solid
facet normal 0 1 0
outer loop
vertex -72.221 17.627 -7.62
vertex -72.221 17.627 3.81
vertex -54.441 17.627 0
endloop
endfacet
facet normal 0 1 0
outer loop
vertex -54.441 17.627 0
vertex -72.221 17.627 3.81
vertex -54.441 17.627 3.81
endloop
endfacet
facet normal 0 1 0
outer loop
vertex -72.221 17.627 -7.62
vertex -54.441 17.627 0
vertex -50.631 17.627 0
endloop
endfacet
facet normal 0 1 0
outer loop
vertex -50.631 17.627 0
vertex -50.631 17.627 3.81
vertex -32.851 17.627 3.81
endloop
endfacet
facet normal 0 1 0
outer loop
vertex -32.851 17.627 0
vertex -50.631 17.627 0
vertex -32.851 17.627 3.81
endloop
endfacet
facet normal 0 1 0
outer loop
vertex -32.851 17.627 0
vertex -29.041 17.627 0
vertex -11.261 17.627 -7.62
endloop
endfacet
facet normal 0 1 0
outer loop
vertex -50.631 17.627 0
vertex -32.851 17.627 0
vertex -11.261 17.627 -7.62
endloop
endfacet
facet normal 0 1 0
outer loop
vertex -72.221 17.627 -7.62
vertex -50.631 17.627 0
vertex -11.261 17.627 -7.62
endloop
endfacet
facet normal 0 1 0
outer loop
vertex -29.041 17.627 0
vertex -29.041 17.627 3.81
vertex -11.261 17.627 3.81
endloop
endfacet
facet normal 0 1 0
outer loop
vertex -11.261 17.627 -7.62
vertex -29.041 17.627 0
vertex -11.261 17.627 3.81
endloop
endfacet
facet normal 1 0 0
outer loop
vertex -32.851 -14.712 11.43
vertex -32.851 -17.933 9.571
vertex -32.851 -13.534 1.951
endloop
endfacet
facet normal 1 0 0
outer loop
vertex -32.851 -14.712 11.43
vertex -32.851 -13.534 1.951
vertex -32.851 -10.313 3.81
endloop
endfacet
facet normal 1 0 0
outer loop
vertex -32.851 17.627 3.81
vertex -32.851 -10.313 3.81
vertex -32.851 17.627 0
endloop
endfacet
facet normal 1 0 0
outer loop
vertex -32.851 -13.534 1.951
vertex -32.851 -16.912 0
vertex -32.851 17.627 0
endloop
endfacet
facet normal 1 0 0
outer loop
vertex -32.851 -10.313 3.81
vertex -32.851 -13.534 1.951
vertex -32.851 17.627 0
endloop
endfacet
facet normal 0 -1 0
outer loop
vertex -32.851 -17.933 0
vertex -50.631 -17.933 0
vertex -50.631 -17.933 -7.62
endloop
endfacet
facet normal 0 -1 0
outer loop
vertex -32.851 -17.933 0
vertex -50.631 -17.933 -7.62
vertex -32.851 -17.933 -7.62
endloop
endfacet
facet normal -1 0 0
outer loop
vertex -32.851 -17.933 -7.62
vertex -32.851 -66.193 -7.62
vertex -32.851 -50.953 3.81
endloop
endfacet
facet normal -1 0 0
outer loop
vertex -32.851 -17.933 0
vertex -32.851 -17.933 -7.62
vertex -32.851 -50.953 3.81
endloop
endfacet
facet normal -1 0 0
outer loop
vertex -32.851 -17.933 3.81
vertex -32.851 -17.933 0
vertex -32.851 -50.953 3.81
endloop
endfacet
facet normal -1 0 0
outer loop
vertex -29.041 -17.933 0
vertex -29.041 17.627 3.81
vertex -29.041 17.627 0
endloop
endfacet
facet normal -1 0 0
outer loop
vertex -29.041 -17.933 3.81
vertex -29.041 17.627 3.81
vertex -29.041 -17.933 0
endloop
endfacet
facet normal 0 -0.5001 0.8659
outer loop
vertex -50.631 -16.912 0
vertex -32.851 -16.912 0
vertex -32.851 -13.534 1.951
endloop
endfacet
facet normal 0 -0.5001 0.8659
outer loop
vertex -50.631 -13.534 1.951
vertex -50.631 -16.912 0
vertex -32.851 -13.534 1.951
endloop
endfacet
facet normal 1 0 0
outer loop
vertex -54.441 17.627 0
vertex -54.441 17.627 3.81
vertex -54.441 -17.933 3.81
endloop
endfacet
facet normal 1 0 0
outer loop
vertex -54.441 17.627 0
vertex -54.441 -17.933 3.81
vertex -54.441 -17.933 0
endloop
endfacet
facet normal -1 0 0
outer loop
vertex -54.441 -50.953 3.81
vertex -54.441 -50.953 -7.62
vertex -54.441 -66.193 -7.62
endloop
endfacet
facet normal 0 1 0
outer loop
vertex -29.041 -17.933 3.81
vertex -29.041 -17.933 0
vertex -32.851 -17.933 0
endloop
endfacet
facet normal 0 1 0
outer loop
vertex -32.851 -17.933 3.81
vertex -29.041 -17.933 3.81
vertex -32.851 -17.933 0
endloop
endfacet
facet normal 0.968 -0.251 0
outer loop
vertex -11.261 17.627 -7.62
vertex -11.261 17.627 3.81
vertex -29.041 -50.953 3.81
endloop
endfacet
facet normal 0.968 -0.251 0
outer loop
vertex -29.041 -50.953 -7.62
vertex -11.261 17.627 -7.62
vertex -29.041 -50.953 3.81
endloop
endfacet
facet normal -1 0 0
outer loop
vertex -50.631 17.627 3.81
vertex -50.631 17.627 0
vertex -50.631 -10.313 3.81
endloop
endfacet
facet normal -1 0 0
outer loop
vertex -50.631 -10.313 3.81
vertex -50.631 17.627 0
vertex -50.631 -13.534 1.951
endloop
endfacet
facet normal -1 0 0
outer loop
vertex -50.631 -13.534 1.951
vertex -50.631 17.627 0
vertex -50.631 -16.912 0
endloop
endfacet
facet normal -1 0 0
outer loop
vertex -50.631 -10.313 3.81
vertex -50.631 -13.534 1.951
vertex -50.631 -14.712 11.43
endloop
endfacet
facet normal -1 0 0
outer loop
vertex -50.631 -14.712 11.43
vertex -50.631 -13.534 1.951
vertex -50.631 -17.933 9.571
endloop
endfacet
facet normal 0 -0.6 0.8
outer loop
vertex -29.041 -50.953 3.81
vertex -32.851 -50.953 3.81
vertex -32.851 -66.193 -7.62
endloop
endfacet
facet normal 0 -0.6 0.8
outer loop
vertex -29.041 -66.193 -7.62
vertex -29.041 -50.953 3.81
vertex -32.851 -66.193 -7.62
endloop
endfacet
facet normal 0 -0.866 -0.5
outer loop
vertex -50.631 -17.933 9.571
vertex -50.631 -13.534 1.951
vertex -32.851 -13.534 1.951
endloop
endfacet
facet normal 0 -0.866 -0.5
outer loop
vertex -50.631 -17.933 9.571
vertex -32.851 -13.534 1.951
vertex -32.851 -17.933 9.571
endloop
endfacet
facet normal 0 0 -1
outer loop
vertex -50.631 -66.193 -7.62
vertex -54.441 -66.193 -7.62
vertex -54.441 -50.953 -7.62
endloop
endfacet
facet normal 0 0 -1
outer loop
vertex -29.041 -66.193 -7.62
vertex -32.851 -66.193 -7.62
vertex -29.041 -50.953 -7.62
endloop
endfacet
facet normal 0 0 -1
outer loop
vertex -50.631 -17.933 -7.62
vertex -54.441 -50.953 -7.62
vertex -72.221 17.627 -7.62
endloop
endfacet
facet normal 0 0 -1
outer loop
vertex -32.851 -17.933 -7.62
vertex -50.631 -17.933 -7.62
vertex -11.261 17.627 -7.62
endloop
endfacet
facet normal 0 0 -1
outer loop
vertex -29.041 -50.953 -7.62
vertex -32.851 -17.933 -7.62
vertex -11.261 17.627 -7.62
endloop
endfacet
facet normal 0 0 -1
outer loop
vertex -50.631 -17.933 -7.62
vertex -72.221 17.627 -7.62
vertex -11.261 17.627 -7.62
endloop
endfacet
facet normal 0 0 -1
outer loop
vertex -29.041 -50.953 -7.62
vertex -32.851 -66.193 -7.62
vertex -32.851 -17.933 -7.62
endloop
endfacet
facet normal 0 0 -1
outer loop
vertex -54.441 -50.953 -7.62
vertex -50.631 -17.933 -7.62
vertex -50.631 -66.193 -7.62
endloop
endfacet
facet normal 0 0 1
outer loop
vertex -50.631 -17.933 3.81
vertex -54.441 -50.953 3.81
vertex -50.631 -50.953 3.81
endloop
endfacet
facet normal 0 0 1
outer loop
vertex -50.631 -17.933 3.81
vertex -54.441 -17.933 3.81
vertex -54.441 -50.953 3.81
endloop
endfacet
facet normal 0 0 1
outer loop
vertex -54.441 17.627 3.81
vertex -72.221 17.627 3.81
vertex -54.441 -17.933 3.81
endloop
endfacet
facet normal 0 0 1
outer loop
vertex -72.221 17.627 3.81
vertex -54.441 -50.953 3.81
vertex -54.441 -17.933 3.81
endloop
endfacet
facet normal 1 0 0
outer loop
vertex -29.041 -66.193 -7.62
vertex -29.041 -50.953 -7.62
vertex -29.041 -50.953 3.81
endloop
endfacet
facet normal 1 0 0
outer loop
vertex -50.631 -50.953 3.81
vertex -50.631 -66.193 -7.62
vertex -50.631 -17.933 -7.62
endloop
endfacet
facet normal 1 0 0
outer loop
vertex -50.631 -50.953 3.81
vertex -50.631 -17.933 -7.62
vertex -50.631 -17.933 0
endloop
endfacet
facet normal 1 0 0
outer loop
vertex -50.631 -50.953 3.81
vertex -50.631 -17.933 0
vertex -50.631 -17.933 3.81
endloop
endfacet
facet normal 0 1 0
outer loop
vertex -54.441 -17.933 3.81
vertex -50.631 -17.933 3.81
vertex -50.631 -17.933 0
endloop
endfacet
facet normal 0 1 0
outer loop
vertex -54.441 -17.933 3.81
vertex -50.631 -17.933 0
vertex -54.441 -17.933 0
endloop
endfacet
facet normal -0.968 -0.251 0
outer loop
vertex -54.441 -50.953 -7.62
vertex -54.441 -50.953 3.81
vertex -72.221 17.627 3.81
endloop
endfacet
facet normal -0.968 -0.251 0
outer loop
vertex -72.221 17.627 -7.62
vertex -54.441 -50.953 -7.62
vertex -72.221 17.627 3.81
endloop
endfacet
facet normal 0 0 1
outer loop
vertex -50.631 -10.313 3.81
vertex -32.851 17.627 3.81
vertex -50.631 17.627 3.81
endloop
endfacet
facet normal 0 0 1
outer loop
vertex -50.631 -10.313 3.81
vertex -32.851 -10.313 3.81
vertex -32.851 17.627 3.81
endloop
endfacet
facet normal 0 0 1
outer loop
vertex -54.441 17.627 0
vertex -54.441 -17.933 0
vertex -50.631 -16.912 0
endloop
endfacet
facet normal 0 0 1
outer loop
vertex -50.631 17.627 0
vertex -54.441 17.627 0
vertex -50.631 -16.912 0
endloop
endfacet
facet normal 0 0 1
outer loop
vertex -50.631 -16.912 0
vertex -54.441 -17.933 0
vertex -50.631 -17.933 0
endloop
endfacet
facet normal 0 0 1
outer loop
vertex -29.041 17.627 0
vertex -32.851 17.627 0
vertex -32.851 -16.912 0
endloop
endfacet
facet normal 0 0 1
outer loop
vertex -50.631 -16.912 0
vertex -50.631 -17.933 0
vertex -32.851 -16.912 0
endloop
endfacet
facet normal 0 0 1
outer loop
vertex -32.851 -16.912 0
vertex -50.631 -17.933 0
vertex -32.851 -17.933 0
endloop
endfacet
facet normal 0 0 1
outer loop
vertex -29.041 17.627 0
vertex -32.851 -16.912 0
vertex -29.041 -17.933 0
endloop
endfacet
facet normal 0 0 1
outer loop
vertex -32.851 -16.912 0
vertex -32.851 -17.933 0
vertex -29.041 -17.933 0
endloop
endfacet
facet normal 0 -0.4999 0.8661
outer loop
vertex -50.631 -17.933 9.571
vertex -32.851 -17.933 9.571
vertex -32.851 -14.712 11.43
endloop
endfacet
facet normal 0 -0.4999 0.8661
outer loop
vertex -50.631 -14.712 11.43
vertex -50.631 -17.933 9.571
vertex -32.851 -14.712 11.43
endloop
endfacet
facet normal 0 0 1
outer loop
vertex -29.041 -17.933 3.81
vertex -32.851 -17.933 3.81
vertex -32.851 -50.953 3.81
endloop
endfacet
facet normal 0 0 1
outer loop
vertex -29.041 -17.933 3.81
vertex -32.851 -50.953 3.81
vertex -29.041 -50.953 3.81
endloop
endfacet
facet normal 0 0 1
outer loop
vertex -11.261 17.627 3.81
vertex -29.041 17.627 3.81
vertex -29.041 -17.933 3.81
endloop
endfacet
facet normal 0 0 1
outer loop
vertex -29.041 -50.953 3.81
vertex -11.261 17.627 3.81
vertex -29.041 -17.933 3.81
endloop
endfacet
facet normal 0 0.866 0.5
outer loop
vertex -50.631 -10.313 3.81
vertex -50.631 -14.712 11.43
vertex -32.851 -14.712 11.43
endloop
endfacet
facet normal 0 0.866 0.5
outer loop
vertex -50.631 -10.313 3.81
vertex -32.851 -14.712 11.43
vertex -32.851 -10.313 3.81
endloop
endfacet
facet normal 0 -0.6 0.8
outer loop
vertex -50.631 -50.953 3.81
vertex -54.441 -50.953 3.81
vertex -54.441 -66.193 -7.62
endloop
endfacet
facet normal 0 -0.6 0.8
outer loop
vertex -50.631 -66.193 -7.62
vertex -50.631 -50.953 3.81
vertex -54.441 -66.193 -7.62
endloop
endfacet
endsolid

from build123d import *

# Parameters (mm, degrees)
F1_DEPTH      = 3.81
F1_DEPTH_BACK = 7.62
F0_W          = 3.81
F0_H          = 17.78
F2_DEPTH      = 7.62
F3_W          = 17.78
F3_H          = 7.62
F4_DEPTH      = 7.62
F6_DEPTH      = 17.78
F7_W          = 17.78
F7_H          = 11.43
F8_DEPTH      = 33.02
F9_DEPTH      = 17.78
F10_W         = 3.81
F10_H         = 11.43
F11_DEPTH     = 15.24
F12_W         = 3.81
F12_H         = 11.43
F13_DEPTH     = 15.24
F15_DEPTH     = 25.4
F18_DEPTH     = 25.4


# Not quite as in the source:
# - a feature names something its author has since deleted; it is built from what else it names


with BuildPart() as f1:
    # F0 (on Top) → F1 (new body, two sides)
    with BuildSketch(Plane.XY) as f1_sk:
        Polygon((-54.4414605618, -0.1530551207), (-79.8414605618, -0.1530551207), (-79.8414605618, -50.9530551207), (-3.6414605618, -50.9530551207), (-3.6414605618, -0.1530551207), (-29.0414605618, -0.1530551207), (-29.0414605618, -17.9330551207), (-32.8514605618, -17.9330551207), (-32.8514605618, -0.1530551207), (-50.6314605618, -0.1530551207), (-50.6314605618, -17.9330551207), (-54.4414605618, -17.9330551207), align=None)
    extrude(amount=F1_DEPTH)
    extrude(f1_sk.sketch, amount=-F1_DEPTH_BACK)

    # F0 (on Top) → F2 (join)
    with BuildSketch(Plane.XY):
        with Locations((-52.5364605618, -9.0430551207)):
            Rectangle(F0_W, F0_H)
        with Locations((-30.9464605618, -9.0430551207)):
            Rectangle(F0_W, F0_H)
    extrude(amount=-F2_DEPTH)

    # F3 (on face) → F4 (join)
    with BuildSketch(Plane.XY.offset(3.81)):
        with Locations((-41.7414605618, -14.1230551207)):
            Rectangle(F3_W, F3_H)
    extrude(amount=F4_DEPTH)

    # F5 (on face) → F6 (cut)
    with BuildSketch(Plane.YZ.offset(-32.8514605618)):
        Polygon((-14.7124641719, 11.43), (-10.3130551207, 3.81), (-10.3130551207, 11.43), align=None)
        Polygon((-17.9330551207, 9.5705909488), (-14.7124641719, 11.43), (-17.9330551207, 11.43), align=None)
        Polygon((-16.9121686975, 0), (-13.5336460694, 1.9505909488), (-17.9330551207, 9.5705909488), (-17.9330551207, 3.81), (-17.9330551207, 0), align=None)
    extrude(amount=-F6_DEPTH, mode=Mode.SUBTRACT)

    # F7 (on face) → F8 (cut)
    with BuildSketch(Plane.XZ.offset(50.9530551207)):
        with Locations((-41.7414605618, -1.905)):
            Rectangle(F7_W, F7_H)
    extrude(amount=-F8_DEPTH, mode=Mode.SUBTRACT)

    # F9 (add): a face of the model
    f9_faces = [f1.faces().sort_by_distance(p)[0] for p in [
        (-41.7414605618, -0.1530551207, -2.0363793103),
    ]]
    extrude(f9_faces, amount=F9_DEPTH)

    # F10 (on face) → F11 (join)
    with BuildSketch(Plane.XZ.offset(50.9530551207)):
        with Locations((-52.5364605618, -1.905)):
            Rectangle(F10_W, F10_H)
    extrude(amount=F11_DEPTH)

    # F12 (on face) → F13 (join)
    with BuildSketch(Plane.XZ.offset(50.9530551207)):
        with Locations((-30.9464605618, -1.905)):
            Rectangle(F12_W, F12_H)
    extrude(amount=F13_DEPTH)

    # F14 (on face) → F15 (cut)
    with BuildSketch(Plane(origin=(-54.4414605618, 0, 0), x_dir=(0, -1, 0), z_dir=(-1, 0, 0))):
        Polygon((66.1930551207, 3.81), (50.9530551207, 3.81), (66.1930551207, -7.62), align=None)
    extrude(amount=-F15_DEPTH, mode=Mode.SUBTRACT)

    # F16 (on face) + F17 (on face) → F18 (cut)
    with BuildSketch(Plane.XY.offset(3.81)):
        Polygon((-54.4414605618, -50.9530551207), (-72.2214605618, 17.6269448793), (-79.8414605618, 17.6269448793), (-79.8414605618, -50.9530551207), align=None)
    with BuildSketch(Plane.XY.offset(3.81)):
        Polygon((-3.6414605618, 17.6269448793), (-11.2614605618, 17.6269448793), (-29.0414605618, -50.9530551207), (-3.6414605618, -50.9530551207), align=None)
    extrude(amount=-F18_DEPTH, mode=Mode.SUBTRACT)


solid = f1.part
